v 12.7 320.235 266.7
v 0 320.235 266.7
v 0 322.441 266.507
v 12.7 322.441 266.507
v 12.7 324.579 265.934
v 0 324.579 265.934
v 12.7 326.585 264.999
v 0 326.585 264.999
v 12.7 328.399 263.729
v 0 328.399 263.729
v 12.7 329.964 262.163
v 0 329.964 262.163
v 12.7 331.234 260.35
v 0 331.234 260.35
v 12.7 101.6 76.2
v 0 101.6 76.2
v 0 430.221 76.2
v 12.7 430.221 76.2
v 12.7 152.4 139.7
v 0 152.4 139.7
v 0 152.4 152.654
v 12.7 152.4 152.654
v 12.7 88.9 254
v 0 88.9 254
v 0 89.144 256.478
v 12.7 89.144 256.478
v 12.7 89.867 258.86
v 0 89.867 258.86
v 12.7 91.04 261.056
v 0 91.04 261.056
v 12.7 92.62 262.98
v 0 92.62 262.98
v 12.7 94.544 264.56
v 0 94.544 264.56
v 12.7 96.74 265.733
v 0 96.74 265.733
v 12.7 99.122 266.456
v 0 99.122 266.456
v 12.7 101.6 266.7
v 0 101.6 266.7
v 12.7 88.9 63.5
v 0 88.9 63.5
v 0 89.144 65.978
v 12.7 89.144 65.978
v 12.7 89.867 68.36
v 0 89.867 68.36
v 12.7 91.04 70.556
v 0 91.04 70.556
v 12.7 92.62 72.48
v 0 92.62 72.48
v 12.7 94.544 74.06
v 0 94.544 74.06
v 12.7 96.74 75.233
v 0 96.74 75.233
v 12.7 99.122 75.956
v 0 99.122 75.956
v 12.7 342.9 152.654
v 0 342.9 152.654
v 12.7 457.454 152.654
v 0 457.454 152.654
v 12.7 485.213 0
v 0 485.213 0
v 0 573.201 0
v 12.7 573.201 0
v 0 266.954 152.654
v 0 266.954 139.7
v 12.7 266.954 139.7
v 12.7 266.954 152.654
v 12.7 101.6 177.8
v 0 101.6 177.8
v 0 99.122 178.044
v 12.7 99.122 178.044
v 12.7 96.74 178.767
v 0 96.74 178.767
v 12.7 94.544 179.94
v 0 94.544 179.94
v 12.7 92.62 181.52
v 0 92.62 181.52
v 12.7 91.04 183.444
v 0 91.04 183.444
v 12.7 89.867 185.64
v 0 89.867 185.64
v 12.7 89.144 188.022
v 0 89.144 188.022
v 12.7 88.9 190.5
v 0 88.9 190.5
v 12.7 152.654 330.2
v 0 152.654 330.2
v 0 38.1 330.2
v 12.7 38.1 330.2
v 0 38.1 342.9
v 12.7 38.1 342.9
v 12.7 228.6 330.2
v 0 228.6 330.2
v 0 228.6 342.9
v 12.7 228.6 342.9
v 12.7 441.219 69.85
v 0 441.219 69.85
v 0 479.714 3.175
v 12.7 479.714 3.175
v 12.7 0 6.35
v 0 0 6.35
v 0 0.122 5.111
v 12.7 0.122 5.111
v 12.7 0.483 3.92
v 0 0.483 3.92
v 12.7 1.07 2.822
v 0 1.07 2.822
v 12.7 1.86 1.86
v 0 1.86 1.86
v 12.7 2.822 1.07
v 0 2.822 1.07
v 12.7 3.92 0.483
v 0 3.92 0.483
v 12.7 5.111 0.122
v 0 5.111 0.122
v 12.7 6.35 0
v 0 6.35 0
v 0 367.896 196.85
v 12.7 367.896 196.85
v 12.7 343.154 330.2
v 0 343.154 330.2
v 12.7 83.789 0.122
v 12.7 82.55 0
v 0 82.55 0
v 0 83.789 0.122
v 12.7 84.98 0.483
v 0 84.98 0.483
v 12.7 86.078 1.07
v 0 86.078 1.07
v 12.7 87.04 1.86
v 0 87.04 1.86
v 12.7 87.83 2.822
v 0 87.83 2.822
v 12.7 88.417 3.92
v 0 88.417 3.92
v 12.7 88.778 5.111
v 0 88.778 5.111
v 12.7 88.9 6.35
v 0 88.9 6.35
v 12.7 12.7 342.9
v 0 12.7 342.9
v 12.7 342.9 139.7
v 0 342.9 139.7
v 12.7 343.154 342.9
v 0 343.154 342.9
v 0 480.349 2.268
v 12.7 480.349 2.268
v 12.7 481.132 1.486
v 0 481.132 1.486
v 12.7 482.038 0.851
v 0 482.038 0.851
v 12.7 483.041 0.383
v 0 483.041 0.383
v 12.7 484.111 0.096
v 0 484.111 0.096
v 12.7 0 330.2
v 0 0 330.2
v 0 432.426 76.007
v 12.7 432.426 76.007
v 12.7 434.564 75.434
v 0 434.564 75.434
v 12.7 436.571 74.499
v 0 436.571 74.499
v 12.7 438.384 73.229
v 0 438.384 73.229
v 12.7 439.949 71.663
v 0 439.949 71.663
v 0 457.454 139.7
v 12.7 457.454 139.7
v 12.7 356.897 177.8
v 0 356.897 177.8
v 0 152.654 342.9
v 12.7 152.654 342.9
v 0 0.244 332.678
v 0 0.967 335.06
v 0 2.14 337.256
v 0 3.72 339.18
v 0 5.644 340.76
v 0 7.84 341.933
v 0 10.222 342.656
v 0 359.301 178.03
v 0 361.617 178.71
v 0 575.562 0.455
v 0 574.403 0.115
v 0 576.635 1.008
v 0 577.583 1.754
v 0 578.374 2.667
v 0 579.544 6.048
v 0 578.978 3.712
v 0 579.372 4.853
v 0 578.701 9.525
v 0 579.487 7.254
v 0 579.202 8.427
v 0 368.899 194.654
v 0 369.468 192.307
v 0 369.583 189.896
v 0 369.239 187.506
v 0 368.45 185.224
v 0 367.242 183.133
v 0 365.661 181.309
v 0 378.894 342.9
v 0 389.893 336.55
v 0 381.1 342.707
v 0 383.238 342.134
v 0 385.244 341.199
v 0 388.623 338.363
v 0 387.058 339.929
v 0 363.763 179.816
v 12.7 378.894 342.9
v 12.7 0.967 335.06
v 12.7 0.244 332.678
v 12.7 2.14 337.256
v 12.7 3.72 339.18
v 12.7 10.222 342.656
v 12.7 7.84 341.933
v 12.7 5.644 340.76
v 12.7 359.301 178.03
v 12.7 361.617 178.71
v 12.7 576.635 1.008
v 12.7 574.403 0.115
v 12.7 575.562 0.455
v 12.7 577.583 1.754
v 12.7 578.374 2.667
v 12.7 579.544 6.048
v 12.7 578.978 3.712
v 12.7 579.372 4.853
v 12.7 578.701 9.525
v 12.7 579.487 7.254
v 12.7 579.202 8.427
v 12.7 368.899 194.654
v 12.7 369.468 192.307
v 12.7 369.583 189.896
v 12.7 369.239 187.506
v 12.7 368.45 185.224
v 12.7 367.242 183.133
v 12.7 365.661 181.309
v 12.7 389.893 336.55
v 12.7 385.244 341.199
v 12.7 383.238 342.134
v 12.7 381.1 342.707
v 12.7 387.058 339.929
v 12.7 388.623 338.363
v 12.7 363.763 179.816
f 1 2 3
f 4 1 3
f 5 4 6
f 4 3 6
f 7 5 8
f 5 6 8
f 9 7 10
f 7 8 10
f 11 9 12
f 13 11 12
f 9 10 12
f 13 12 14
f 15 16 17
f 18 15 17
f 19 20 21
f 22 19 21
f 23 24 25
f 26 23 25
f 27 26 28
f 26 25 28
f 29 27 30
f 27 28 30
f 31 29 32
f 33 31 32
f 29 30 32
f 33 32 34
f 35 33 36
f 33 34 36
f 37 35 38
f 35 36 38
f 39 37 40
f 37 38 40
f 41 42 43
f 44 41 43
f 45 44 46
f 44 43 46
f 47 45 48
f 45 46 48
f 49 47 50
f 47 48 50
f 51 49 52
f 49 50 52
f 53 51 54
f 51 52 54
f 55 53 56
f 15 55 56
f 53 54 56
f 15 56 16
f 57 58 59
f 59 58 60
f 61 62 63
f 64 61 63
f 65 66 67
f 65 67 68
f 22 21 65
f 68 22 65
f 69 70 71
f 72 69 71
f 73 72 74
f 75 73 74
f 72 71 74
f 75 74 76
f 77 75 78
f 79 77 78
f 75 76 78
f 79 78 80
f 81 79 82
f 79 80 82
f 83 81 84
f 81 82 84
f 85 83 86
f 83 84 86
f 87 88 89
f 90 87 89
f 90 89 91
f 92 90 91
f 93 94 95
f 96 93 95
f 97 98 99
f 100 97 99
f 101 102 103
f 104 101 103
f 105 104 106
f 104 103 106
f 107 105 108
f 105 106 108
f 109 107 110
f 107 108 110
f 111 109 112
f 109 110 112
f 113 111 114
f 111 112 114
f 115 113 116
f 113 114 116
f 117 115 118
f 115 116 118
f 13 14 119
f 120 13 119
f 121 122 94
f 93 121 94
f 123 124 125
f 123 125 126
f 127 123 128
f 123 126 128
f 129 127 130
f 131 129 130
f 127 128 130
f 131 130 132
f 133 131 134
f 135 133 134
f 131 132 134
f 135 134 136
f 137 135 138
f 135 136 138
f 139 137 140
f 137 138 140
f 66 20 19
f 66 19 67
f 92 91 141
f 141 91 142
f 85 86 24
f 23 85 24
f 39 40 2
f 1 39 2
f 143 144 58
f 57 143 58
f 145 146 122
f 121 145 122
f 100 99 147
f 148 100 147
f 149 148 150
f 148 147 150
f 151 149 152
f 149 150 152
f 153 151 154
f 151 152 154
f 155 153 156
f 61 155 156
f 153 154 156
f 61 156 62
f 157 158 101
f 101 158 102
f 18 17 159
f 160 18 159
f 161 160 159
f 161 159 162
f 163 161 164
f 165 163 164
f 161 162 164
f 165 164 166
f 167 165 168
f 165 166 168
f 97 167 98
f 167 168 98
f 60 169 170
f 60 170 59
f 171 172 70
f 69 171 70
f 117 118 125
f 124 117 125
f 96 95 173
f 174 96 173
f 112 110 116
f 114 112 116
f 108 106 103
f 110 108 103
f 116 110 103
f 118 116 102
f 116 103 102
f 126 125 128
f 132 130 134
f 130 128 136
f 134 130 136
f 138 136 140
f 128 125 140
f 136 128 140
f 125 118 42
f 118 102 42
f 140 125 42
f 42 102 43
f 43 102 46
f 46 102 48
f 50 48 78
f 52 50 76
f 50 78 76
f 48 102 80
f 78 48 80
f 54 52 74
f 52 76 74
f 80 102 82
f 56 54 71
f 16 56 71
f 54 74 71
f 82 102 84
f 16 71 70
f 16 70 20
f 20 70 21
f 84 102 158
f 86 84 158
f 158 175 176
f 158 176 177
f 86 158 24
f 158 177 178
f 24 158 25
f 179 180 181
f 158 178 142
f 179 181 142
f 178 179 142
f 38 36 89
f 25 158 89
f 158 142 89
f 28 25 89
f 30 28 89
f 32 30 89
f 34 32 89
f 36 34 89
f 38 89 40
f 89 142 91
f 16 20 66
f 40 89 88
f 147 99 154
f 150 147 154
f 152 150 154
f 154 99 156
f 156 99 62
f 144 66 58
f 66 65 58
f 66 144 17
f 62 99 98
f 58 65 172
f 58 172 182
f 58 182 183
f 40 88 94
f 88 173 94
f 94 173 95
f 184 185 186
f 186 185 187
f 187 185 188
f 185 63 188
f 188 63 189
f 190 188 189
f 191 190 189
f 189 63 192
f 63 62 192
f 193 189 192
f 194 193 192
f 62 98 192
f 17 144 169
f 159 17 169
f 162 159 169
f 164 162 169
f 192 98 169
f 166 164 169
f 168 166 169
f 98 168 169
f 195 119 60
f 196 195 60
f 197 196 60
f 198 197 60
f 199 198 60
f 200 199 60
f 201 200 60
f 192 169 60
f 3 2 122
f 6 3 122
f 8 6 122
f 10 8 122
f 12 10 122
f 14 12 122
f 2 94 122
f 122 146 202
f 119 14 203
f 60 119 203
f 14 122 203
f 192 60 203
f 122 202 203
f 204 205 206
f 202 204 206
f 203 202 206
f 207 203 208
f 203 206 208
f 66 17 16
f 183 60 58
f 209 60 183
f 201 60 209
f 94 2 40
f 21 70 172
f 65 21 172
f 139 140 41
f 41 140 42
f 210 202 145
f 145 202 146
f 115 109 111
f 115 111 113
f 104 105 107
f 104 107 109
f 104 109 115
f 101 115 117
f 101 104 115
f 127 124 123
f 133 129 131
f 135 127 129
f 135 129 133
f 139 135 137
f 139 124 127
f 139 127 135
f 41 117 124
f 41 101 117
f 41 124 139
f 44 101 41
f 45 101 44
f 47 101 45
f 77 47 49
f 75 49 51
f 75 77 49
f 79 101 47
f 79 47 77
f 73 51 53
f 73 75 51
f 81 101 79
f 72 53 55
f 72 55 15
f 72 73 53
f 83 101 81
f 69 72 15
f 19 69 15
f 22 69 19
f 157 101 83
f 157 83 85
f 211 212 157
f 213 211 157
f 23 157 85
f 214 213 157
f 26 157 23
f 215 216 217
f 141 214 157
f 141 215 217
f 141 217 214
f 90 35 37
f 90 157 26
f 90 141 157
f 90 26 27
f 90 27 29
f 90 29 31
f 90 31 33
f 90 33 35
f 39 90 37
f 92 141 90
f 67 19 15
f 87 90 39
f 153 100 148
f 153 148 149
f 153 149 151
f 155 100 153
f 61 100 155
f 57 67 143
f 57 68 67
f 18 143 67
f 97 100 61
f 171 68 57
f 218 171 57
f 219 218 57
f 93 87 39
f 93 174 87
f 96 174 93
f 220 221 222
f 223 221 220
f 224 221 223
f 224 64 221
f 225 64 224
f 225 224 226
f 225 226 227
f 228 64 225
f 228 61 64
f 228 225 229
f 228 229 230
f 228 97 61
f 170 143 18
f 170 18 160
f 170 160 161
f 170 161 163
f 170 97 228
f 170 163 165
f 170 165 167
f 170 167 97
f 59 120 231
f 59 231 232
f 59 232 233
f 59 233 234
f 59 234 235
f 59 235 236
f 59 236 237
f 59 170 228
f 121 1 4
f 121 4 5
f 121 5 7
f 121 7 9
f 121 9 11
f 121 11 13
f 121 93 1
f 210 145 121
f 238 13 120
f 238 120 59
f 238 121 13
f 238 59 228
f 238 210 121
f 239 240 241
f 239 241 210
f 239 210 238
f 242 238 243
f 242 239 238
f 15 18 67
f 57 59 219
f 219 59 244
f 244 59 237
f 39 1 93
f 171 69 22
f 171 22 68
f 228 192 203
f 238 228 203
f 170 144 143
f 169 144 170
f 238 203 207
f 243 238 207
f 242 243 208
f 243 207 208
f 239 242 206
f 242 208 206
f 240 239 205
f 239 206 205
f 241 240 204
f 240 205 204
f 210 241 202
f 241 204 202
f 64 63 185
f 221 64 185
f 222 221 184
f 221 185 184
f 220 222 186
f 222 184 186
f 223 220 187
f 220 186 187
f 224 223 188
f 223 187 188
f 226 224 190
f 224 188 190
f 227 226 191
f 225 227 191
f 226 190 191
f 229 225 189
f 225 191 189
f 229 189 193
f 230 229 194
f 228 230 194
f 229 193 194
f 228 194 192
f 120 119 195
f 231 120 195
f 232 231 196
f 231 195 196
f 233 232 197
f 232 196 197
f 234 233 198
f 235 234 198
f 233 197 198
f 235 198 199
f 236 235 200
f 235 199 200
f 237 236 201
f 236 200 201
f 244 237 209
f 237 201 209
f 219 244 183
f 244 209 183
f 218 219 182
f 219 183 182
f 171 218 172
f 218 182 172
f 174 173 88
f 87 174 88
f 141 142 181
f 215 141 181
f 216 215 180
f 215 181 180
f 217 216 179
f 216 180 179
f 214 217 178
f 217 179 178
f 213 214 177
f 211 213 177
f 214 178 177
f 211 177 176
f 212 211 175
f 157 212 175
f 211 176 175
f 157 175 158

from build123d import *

# Parameters (mm, degrees)
F0_W     = 114.554
F0_H     = 12.954
F1_DEPTH = 12.7


with BuildPart() as f1:
    # F0 (on Right) → F1 (new body)
    with BuildSketch(Plane.YZ):
        with BuildLine():
            ThreePointArc((0, 6.35), (1.859872, 1.859872), (6.35, 0))
            Line((6.35, 0), (82.55, 0))
            ThreePointArc((82.55, 0), (87.040128, 1.859872), (88.9, 6.35))
            Line((88.9, 6.35), (88.9, 63.5))
            ThreePointArc((88.9, 63.5), (92.619744, 72.480256), (101.6, 76.2))
            Line((101.6, 76.2), (430.220683, 76.2))
            ThreePointArc((430.220683, 76.2), (436.570683, 74.498523), (441.219206, 69.85))
            Line((441.219206, 69.85), (479.714035, 3.175))
            ThreePointArc((479.714035, 3.175), (482.038296, 0.850739), (485.213296, 0))
            Line((485.213296, 0), (573.201477, 0))
            ThreePointArc((573.201477, 0), (578.700739, 3.175), (578.700739, 9.525))
            Line((578.700739, 9.525), (389.892767, 336.55))
            ThreePointArc((389.892767, 336.55), (385.244244, 341.198523), (378.894244, 342.9))
            Line((378.894244, 342.9), (343.154, 342.9))
            Line((343.154, 342.9), (343.154, 330.2))
            Line((343.154, 330.2), (228.6, 330.2))
            Line((228.6, 330.2), (228.6, 342.9))
            Line((228.6, 342.9), (152.654, 342.9))
            Line((152.654, 342.9), (152.654, 330.2))
            Line((152.654, 330.2), (38.1, 330.2))
            Line((38.1, 330.2), (38.1, 342.9))
            Line((38.1, 342.9), (12.7, 342.9))
            ThreePointArc((12.7, 342.9), (3.719744, 339.180256), (0, 330.2))
            Line((0, 330.2), (0, 6.35))
        make_face()
        with Locations((209.677, 146.177)):
            Rectangle(F0_W, F0_H, mode=Mode.SUBTRACT)
        with Locations((400.177, 146.177)):
            Rectangle(F0_W, F0_H, mode=Mode.SUBTRACT)
        with BuildLine():
            Line((88.9, 190.5), (88.9, 254))
            ThreePointArc((88.9, 254), (92.619744, 262.980256), (101.6, 266.7))
            Line((101.6, 266.7), (320.235457, 266.7))
            ThreePointArc((320.235457, 266.7), (326.585457, 264.998523), (331.23398, 260.35))
            Line((331.23398, 260.35), (367.895722, 196.85))
            ThreePointArc((367.895722, 196.85), (367.895722, 184.15), (356.897199, 177.8))
            Line((356.897199, 177.8), (101.6, 177.8))
            ThreePointArc((101.6, 177.8), (92.619744, 181.519744), (88.9, 190.5))
        make_face(mode=Mode.SUBTRACT)
    extrude(amount=F1_DEPTH)


solid = f1.part
